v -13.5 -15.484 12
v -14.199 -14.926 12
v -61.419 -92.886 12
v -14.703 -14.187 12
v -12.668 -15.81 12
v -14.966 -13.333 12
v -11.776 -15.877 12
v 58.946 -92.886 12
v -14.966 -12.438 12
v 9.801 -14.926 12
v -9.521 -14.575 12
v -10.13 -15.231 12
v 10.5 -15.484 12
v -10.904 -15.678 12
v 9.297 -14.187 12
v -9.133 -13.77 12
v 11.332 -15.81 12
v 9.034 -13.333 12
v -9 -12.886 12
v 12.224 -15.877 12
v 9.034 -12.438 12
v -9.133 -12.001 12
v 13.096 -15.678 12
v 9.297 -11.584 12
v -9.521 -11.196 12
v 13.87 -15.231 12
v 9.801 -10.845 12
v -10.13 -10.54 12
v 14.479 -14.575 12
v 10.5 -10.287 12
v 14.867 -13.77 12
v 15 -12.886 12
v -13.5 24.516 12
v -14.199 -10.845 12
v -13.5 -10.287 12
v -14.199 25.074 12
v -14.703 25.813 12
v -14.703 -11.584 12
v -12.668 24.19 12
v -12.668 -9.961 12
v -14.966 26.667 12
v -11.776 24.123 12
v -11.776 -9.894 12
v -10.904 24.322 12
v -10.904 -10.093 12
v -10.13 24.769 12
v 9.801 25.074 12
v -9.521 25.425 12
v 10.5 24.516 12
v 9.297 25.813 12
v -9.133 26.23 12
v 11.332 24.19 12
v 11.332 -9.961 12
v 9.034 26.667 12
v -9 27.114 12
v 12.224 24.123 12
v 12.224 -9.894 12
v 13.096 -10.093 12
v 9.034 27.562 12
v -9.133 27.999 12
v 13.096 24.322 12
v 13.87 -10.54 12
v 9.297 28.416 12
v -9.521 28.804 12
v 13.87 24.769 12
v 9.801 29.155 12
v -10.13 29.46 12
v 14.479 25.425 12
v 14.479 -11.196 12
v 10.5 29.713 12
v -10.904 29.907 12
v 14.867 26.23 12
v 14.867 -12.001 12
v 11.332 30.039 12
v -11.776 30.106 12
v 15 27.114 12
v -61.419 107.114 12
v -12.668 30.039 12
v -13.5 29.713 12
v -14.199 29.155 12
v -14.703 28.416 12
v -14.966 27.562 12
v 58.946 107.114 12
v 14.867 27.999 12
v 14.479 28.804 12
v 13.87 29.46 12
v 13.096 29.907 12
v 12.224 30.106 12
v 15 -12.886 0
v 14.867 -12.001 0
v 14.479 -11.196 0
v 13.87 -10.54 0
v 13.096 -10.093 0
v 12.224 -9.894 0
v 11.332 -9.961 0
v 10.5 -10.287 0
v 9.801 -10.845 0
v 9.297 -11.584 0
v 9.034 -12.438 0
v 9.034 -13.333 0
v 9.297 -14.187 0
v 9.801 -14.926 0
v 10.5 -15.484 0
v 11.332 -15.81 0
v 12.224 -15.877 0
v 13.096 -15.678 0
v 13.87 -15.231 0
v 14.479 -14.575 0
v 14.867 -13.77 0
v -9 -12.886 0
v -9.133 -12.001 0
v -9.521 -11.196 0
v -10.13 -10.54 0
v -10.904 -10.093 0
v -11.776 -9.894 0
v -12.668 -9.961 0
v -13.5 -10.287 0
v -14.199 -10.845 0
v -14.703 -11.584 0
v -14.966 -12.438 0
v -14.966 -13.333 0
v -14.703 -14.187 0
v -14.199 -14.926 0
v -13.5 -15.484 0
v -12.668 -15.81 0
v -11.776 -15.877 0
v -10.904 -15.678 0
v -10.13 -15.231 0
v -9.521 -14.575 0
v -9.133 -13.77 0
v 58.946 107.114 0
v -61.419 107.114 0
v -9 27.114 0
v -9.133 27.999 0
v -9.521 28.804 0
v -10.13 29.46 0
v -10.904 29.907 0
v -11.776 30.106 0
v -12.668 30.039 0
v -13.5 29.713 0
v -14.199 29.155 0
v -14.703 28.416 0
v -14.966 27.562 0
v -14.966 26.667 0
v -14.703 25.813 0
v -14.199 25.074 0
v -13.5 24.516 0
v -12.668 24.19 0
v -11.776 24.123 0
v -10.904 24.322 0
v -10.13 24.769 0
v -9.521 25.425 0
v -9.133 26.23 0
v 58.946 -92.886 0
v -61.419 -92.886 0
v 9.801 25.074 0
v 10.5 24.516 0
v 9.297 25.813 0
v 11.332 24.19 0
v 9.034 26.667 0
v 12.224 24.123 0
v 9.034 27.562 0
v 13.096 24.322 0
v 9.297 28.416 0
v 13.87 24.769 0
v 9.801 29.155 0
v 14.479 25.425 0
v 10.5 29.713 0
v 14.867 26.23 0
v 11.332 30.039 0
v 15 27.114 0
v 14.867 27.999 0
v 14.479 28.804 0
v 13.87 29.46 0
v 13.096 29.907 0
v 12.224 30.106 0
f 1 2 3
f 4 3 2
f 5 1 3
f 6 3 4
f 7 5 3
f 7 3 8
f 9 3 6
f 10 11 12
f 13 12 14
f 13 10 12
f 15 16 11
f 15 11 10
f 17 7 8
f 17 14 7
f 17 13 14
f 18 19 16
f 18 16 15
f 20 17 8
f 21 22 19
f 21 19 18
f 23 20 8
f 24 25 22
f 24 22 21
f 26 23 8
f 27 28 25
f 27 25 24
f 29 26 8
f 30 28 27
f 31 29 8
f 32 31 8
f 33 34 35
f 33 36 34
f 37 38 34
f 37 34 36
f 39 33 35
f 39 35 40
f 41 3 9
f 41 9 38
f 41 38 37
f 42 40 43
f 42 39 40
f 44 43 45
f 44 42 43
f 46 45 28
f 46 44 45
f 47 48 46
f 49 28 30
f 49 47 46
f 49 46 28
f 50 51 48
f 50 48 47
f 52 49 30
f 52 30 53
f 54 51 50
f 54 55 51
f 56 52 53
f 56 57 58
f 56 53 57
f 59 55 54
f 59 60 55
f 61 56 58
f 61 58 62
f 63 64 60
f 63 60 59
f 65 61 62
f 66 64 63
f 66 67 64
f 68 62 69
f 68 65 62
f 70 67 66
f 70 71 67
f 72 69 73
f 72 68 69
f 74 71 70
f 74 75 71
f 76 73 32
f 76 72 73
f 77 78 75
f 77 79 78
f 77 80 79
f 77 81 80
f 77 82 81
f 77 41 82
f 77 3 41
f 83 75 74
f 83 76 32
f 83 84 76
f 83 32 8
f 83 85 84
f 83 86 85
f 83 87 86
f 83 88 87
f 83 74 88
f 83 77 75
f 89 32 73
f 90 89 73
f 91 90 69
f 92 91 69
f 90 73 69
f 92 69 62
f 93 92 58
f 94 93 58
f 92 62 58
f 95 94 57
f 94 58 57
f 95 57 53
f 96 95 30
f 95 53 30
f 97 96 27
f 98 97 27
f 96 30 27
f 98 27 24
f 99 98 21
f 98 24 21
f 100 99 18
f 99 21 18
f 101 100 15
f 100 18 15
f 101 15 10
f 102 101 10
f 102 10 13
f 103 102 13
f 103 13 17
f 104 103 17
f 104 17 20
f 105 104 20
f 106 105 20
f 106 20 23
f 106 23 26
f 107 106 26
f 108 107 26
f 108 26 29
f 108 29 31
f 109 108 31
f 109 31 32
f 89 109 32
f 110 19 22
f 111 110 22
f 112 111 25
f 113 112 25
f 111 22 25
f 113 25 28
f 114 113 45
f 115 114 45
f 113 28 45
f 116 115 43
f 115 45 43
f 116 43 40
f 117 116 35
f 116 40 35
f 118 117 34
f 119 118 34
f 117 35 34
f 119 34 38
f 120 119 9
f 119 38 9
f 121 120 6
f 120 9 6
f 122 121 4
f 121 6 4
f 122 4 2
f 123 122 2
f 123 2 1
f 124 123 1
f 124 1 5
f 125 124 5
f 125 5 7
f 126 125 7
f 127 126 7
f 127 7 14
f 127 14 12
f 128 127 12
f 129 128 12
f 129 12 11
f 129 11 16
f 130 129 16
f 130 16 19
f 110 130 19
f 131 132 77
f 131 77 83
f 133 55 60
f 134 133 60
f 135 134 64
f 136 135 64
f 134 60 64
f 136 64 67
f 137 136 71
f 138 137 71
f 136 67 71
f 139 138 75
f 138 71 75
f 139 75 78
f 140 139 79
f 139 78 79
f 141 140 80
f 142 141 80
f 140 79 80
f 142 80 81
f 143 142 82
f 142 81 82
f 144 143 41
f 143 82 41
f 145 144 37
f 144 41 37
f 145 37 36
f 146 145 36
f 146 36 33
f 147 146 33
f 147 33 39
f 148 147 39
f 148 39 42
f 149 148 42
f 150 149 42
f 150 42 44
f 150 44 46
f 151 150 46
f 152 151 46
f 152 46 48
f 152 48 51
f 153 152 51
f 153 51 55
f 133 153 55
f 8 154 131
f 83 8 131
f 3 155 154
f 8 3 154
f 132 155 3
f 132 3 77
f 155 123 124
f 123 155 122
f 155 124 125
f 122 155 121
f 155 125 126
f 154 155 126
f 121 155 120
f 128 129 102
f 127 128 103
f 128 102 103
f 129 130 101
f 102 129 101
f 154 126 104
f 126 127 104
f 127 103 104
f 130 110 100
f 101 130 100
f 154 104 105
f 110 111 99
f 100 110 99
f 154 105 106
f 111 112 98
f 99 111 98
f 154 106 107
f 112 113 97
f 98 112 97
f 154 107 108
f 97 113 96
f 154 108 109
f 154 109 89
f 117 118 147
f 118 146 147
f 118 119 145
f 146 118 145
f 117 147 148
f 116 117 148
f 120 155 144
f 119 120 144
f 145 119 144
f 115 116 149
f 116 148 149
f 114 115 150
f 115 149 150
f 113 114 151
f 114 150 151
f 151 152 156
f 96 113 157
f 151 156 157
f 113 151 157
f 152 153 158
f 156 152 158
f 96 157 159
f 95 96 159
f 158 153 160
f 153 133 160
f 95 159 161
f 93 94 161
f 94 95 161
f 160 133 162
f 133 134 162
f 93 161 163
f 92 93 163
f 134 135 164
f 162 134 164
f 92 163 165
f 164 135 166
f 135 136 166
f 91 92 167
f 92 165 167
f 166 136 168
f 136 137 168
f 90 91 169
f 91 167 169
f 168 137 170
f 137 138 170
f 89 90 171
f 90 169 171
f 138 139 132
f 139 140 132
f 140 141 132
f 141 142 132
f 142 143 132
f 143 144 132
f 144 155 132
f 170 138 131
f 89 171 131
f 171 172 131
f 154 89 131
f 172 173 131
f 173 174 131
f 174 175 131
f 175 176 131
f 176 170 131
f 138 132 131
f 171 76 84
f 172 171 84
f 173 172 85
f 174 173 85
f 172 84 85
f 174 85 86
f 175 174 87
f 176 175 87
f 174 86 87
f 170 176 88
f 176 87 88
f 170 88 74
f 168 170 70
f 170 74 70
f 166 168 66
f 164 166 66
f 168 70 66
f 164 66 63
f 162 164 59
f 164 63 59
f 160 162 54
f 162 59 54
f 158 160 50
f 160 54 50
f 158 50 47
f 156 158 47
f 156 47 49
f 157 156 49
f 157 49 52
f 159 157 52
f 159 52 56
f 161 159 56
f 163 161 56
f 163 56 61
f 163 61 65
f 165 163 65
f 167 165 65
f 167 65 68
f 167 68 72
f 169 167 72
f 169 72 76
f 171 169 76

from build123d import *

# Parameters (mm, degrees)
CROQUIS1_W              = 120.365138791
CROQUIS1_H              = 200
SALIENTE_EXTRUIR1_DEPTH = 12
CORTAR_EXTRUIR1_REACH   = 126.056
CROQUIS2_R              = 3


with BuildPart() as part:
    # Croquis1 → Saliente-Extruir1 (new body)
    with BuildSketch(Plane.XY):
        with Locations((-1.236709328, 7.114481003)):
            Rectangle(CROQUIS1_W, CROQUIS1_H)
    extrude(amount=SALIENTE_EXTRUIR1_DEPTH)

    # Croquis2 → Cortar-Extruir1 (cut, up to next)
    with BuildSketch(Plane.XY.offset(12), mode=Mode.PRIVATE) as cortar_extruir1_sk1:
        with Locations((-12, 27.114481003)):
            Circle(CROQUIS2_R)
    cortar_extruir1_tool1 = extrude(cortar_extruir1_sk1.sketch, amount=-CORTAR_EXTRUIR1_REACH, mode=Mode.PRIVATE) & part.part
    # Croquis2 → Cortar-Extruir1 (cut, up to next)
    with BuildSketch(Plane.XY.offset(12), mode=Mode.PRIVATE) as cortar_extruir1_sk2:
        with Locations((12, 27.114481003)):
            Circle(CROQUIS2_R)
    cortar_extruir1_tool2 = extrude(cortar_extruir1_sk2.sketch, amount=-CORTAR_EXTRUIR1_REACH, mode=Mode.PRIVATE) & part.part
    # Croquis2 → Cortar-Extruir1 (cut, up to next)
    with BuildSketch(Plane.XY.offset(12), mode=Mode.PRIVATE) as cortar_extruir1_sk3:
        with Locations((-12, -12.885518997)):
            Circle(CROQUIS2_R)
    cortar_extruir1_tool3 = extrude(cortar_extruir1_sk3.sketch, amount=-CORTAR_EXTRUIR1_REACH, mode=Mode.PRIVATE) & part.part
    # Croquis2 → Cortar-Extruir1 (cut, up to next)
    with BuildSketch(Plane.XY.offset(12), mode=Mode.PRIVATE) as cortar_extruir1_sk4:
        with Locations((12, -12.885518997)):
            Circle(CROQUIS2_R)
    cortar_extruir1_tool4 = extrude(cortar_extruir1_sk4.sketch, amount=-CORTAR_EXTRUIR1_REACH, mode=Mode.PRIVATE) & part.part
    add(cortar_extruir1_tool1.solids().sort_by_distance((-12, 27.114481, 12))[0], mode=Mode.SUBTRACT)
    add(cortar_extruir1_tool2.solids().sort_by_distance((12, 27.114481, 12))[0], mode=Mode.SUBTRACT)
    add(cortar_extruir1_tool3.solids().sort_by_distance((-12, -12.885519, 12))[0], mode=Mode.SUBTRACT)
    add(cortar_extruir1_tool4.solids().sort_by_distance((12, -12.885519, 12))[0], mode=Mode.SUBTRACT)


solid = part.part
